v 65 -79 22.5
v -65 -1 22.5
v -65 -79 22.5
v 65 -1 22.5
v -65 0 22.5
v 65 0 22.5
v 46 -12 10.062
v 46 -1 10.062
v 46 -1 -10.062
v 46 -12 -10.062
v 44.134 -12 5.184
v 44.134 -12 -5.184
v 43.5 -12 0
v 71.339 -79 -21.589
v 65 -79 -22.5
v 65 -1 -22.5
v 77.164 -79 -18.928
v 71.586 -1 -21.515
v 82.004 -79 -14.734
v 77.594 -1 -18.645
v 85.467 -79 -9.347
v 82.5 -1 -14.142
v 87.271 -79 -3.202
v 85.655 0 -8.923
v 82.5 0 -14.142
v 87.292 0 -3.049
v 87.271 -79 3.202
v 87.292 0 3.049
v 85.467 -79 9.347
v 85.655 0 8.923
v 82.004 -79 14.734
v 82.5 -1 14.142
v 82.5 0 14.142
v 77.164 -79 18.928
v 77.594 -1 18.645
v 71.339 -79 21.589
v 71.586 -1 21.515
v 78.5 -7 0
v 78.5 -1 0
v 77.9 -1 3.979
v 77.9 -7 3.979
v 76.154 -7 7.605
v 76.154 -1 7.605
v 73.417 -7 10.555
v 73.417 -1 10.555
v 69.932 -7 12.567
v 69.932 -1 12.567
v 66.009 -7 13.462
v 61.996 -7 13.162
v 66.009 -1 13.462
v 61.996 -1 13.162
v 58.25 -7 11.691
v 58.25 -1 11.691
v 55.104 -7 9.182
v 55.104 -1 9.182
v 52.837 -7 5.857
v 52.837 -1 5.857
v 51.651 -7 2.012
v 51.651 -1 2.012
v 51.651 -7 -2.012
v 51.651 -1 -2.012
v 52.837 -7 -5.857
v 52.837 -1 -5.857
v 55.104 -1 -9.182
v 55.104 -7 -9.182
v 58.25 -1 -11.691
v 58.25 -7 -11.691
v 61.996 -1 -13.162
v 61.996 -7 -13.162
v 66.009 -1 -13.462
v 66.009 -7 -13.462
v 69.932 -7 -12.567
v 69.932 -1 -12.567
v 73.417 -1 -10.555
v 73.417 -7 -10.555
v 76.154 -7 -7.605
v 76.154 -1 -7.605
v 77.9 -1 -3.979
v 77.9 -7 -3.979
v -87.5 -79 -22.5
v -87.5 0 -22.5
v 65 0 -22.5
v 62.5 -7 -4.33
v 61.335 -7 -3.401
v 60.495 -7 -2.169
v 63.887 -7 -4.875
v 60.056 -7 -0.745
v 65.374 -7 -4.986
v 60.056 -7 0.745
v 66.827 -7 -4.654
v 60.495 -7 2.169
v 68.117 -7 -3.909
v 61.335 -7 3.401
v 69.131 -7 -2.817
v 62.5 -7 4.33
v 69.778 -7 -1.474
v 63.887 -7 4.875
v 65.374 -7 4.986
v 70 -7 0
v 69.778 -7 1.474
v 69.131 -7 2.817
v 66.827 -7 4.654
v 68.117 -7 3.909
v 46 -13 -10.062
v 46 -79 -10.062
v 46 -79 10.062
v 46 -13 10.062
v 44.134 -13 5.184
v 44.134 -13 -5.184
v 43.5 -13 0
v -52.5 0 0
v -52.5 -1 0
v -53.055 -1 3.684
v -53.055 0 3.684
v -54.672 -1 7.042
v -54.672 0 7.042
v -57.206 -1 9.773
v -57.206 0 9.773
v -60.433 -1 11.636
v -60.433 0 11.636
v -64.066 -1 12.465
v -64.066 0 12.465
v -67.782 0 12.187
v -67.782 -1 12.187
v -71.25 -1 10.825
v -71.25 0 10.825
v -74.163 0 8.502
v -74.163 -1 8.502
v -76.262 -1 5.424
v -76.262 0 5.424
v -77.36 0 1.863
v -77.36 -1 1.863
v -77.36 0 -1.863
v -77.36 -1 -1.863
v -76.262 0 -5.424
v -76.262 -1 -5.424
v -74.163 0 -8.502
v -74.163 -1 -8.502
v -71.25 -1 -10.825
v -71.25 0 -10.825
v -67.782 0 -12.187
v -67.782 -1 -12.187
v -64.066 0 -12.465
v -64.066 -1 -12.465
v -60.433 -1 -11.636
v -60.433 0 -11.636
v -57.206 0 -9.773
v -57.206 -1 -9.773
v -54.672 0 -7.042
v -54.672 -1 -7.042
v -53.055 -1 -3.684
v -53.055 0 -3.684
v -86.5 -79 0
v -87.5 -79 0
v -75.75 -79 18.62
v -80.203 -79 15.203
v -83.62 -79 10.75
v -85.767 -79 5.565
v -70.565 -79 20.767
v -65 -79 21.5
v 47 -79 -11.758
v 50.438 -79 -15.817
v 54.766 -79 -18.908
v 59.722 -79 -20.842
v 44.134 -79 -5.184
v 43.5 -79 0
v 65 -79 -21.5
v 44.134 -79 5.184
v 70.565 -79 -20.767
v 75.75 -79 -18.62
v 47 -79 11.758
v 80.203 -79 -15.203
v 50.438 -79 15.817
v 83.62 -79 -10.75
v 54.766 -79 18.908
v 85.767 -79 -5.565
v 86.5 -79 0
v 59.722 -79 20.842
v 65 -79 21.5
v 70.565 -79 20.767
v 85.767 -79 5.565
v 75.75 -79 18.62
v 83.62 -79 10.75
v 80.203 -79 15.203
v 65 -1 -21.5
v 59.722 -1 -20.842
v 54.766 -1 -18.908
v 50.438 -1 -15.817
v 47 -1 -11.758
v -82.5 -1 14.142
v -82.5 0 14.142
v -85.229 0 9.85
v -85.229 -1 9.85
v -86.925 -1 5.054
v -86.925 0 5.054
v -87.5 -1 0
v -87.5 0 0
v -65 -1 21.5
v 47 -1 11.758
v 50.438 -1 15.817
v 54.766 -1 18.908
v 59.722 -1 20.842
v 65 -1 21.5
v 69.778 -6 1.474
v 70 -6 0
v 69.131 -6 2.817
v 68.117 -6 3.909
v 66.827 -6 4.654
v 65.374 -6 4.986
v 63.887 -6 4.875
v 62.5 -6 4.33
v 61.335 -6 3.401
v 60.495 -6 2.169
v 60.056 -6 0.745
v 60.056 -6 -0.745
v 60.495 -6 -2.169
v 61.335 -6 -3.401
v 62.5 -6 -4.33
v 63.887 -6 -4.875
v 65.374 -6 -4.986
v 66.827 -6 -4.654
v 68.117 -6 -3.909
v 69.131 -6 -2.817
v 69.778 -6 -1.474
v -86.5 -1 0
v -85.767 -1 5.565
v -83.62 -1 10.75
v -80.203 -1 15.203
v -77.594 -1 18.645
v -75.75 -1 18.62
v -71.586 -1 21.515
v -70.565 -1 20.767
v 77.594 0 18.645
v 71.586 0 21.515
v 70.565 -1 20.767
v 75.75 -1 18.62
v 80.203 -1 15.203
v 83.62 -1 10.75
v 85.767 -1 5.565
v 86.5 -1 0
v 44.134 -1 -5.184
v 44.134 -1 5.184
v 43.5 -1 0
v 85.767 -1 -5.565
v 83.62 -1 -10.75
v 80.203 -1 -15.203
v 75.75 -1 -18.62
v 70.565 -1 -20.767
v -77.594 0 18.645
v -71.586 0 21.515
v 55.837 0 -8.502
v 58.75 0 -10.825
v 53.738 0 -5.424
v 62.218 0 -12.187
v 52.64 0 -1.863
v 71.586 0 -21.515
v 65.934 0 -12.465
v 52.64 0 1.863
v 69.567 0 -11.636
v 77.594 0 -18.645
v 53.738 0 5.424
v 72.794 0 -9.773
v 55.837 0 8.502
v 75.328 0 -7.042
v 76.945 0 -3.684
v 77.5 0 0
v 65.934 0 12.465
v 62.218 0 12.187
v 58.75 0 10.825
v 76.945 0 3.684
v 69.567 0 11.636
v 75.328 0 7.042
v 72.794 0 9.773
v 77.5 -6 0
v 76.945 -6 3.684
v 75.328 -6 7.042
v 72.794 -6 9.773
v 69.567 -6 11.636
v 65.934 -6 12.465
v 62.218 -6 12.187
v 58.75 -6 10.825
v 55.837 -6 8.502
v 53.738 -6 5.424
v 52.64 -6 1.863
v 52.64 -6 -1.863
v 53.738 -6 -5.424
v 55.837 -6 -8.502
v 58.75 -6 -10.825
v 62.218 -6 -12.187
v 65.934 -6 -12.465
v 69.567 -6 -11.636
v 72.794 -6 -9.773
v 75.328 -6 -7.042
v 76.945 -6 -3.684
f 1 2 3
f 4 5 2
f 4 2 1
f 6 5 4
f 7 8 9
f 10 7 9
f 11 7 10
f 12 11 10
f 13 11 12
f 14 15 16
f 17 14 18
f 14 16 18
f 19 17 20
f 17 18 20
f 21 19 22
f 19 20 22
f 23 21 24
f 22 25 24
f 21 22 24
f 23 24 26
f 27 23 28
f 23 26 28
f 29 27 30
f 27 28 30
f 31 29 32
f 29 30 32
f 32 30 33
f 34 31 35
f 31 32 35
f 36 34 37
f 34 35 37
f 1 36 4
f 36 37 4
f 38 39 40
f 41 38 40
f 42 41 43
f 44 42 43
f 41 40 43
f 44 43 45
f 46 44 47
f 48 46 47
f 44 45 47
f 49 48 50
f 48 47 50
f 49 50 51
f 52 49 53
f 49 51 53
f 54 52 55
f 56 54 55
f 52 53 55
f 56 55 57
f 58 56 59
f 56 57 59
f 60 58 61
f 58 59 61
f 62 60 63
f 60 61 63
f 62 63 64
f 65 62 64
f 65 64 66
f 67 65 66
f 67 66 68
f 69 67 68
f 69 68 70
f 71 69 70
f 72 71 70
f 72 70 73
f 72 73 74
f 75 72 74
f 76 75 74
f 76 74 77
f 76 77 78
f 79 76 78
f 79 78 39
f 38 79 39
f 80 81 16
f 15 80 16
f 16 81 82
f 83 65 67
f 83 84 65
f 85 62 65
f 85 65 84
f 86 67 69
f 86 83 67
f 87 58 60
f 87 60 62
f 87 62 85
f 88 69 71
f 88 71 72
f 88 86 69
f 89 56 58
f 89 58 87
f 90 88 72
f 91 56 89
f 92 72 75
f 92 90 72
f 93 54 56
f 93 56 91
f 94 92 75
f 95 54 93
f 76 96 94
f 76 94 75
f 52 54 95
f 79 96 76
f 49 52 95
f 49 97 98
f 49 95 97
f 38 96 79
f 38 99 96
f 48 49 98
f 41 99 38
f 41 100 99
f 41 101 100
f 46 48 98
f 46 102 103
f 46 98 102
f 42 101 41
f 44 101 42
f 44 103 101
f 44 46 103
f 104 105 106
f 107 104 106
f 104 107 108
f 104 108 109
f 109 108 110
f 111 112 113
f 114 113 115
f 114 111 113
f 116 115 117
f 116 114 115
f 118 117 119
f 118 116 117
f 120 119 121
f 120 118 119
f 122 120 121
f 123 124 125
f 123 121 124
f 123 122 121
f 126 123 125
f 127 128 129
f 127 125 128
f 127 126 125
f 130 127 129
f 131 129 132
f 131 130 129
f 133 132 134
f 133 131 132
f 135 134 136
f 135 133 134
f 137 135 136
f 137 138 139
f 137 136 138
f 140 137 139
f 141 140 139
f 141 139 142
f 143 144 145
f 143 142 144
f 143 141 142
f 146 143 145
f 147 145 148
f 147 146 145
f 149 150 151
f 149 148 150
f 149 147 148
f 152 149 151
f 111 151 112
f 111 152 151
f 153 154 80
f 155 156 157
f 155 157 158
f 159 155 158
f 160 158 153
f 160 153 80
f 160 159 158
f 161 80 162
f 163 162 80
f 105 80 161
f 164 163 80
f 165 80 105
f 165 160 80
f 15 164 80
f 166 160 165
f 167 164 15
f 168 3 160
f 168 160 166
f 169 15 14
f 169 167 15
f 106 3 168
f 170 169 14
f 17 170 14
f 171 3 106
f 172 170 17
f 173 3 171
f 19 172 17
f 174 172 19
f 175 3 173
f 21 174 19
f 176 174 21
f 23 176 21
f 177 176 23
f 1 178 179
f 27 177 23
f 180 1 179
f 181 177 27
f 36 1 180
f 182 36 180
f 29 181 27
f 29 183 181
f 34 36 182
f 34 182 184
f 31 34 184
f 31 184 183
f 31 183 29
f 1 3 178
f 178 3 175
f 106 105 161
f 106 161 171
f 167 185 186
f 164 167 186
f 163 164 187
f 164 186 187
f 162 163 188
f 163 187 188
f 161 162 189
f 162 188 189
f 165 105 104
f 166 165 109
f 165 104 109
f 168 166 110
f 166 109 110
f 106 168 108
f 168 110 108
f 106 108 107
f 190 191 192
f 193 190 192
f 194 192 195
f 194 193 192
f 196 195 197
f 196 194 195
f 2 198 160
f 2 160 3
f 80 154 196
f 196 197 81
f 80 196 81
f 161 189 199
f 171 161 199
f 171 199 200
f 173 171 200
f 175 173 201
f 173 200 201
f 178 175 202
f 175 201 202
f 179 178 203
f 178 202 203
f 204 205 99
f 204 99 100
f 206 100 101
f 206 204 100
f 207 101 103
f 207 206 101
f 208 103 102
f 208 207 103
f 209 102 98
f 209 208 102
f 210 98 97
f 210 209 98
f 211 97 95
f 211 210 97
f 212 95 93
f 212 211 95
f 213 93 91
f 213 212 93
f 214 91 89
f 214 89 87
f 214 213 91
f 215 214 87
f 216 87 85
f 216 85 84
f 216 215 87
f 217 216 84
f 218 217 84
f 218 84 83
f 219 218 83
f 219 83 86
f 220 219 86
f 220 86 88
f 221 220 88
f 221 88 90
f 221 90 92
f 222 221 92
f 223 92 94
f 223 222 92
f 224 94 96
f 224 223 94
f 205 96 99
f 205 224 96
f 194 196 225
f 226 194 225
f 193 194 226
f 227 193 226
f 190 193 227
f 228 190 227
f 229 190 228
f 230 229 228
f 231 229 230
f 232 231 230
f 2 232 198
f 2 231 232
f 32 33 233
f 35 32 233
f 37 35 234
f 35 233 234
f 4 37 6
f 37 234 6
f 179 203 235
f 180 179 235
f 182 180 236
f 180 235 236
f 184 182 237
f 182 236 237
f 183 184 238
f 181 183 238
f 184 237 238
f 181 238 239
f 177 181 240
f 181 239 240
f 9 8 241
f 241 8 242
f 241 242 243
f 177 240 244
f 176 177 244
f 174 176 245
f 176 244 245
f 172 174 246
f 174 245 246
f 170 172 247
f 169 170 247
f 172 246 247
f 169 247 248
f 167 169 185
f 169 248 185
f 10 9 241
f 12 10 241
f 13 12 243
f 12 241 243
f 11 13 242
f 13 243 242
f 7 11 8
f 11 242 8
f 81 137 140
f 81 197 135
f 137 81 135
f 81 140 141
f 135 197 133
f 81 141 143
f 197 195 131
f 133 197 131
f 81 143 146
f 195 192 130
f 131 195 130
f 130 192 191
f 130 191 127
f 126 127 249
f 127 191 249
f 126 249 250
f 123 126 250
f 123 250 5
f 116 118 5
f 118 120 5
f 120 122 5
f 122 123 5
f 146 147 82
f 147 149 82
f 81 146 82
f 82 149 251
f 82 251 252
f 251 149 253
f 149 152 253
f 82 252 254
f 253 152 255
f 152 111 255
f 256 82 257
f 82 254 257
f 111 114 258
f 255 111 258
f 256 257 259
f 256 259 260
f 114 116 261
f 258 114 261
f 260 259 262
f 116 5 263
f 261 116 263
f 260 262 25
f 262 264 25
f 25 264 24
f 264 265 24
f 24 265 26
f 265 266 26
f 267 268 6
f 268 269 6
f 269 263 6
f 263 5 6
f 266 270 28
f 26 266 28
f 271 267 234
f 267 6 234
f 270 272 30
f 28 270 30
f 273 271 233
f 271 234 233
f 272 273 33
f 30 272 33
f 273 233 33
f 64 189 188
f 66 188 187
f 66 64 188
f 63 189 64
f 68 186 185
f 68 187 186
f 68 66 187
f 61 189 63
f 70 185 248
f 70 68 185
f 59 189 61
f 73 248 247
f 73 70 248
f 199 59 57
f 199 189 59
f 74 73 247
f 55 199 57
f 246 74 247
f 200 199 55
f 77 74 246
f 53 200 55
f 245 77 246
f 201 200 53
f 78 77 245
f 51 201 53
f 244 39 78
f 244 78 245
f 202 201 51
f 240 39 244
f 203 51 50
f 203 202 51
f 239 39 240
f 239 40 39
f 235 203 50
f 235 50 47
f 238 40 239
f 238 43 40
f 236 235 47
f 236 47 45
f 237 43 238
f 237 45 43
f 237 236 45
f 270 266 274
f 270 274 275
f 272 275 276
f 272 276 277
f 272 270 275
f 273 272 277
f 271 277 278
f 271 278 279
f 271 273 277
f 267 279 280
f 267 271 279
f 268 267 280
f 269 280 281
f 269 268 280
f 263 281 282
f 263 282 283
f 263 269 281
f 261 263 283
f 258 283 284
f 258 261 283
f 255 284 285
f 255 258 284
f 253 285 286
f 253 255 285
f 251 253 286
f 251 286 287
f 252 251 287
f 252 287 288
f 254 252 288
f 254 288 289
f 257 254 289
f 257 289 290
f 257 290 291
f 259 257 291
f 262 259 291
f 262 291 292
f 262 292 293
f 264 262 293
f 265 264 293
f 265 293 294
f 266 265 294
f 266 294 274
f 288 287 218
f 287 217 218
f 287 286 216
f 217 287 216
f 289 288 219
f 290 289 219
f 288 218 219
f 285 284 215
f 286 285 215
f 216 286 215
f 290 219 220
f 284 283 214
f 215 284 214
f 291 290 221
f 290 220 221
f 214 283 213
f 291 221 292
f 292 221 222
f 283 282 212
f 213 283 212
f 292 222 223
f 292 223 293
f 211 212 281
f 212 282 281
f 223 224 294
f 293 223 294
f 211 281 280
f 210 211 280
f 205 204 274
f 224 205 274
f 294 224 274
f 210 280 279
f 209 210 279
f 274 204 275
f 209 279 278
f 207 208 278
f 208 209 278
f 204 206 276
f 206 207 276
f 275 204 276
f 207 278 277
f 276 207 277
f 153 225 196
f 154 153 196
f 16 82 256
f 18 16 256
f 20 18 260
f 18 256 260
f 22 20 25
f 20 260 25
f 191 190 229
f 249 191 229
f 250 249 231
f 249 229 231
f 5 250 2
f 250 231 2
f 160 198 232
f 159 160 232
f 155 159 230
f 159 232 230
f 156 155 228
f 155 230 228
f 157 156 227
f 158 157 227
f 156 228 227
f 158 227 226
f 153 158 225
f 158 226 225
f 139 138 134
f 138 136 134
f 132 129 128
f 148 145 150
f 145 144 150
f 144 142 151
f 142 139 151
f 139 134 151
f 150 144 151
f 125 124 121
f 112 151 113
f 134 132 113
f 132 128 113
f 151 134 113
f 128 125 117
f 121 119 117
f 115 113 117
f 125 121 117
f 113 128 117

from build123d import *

# Parameters (mm, degrees)
F0_W      = 165
F0_H      = 45
F0_R      = 12.5
F1_DEPTH  = 1
F3_DEPTH  = 1
F4_DEPTH  = 25
F5_DEPTH  = 25
F6_R      = 13.5
F6_R_2    = 12.5
F7_DEPTH  = 5
F8_R      = 13.5
F8_R_2    = 5
F9_DEPTH  = 1
F11_DEPTH = 1
F12_W     = 1
F12_H     = 1
F12_H_2   = 36
F12_W_2   = 92
F13_DEPTH = 11
F14_W     = 94
F14_H     = 37
F15_DEPTH = 1
F16_W     = 1
F16_H     = 36
F17_DEPTH = 66
F18_W     = 26.2803444985
F18_H     = 1
F19_DEPTH = 3
F20_W     = 130
F20_H     = 1
F21_DEPTH = 78


with BuildPart() as f1:
    # F0 (on Front) → F1 (new body)
    with BuildSketch(Plane.XZ):
        Rectangle(F0_W, F0_H)
        with Locations((-65, 0)):
            Circle(F0_R, mode=Mode.SUBTRACT)
        with Locations((65, 0)):
            Circle(F0_R, mode=Mode.SUBTRACT)
    extrude(amount=F1_DEPTH)

    # F2 (on face) → F3 (join)
    with BuildSketch(Plane.XZ.offset(1)):
        with BuildLine():
            Line((68.3925151825, -19.0988145769), (65, -22.5))
            ThreePointArc((65, -22.5), (87.5, 0), (65, 22.5))
            Line((65, 22.5), (71.474224329, 16.2770561874))
            Line((71.474224329, 16.2770561874), (77.4062722921, 9.1145541519))
            Line((77.4062722921, 9.1145541519), (80.3926512599, 2.1407562308))
            Line((80.3926512599, 2.1407562308), (80.3926512599, -5.2317115478))
            Line((80.3926512599, -5.2317115478), (78.3914923668, -12.1520543471))
            Line((78.3914923668, -12.1520543471), (74.6632069349, -14.4081749022))
            Line((74.6632069349, -14.4081749022), (68.3925151825, -19.0988145769))
        make_face()
        with BuildLine():
            Line((-65, 14.9617949501), (-65, 22.5))
            ThreePointArc((-65, 22.5), (-87.5, 0), (-65, -22.5))
            Line((-65, -22.5), (-67.4760043621, -15.6979020685))
            Line((-67.4760043621, -15.6979020685), (-72.8440880775, -12.9142012447))
            Line((-72.8440880775, -12.9142012447), (-76.5851810575, -7.8018400818))
            Line((-76.5851810575, -7.8018400818), (-79.5639529824, 0))
            Line((-79.5639529824, 0), (-79.5639529824, 6.4657721668))
            Line((-79.5639529824, 6.4657721668), (-75.4495188594, 11.7608513683))
            Line((-75.4495188594, 11.7608513683), (-65, 14.9617949501))
        make_face()
    extrude(amount=-F3_DEPTH)

    # F2 (on face) → F4 (cut)
    with BuildSketch(Plane.XZ.offset(1)):
        with BuildLine():
            Line((-82.5, 22.5), (-82.5, 14.1421356237))
            ThreePointArc((-82.5, 14.1421356237), (-74.6966991411, 20.3033008589), (-65, 22.5))
            Line((-65, 22.5), (-82.5, 22.5))
        make_face()
    extrude(amount=-F4_DEPTH, mode=Mode.SUBTRACT)

    # F2 (on face) → F5 (cut)
    with BuildSketch(Plane.XZ.offset(1)):
        with BuildLine():
            ThreePointArc((82.5, -14.1421356237), (74.6966991411, -20.3033008589), (65, -22.5))
            Line((65, -22.5), (82.5, -22.5))
            Line((82.5, -22.5), (82.5, -14.1421356237))
        make_face()
        with BuildLine():
            ThreePointArc((65, 22.5), (74.6966991411, 20.3033008589), (82.5, 14.1421356237))
            Line((82.5, 14.1421356237), (82.5, 22.5))
            Line((82.5, 22.5), (65, 22.5))
        make_face()
        with BuildLine():
            Line((-82.5, -22.5), (-65, -22.5))
            ThreePointArc((-65, -22.5), (-74.6966991411, -20.3033008589), (-82.5, -14.1421356237))
            Line((-82.5, -14.1421356237), (-82.5, -22.5))
        make_face()
    extrude(amount=-F5_DEPTH, mode=Mode.SUBTRACT)

    # F6 (on face) → F7 (join)
    with BuildSketch(Plane.XZ.offset(1)):
        with Locations((-65, 0)):
            Circle(F6_R)
        with Locations((-65, 0)):
            Circle(F6_R_2, mode=Mode.SUBTRACT)
        with Locations((65, 0)):
            Circle(F6_R)
        with Locations((65, 0)):
            Circle(F6_R_2, mode=Mode.SUBTRACT)
    extrude(amount=F7_DEPTH)

    # F8 (on face) → F9 (join)
    with BuildSketch(Plane.XZ.offset(6)):
        with Locations((-65, 0)):
            Circle(F8_R)
        with Locations((-65, 0)):
            Circle(F8_R_2, mode=Mode.SUBTRACT)
        with Locations((65, 0)):
            Circle(F8_R)
        with Locations((65, 0)):
            Circle(F8_R_2, mode=Mode.SUBTRACT)
    extrude(amount=F9_DEPTH)

    # F10 (on face) → F11 (join)
    with BuildSketch(Plane.XZ.offset(1)):
        Polygon((-81.9395110011, 0), (-87.5, 0), (-87.5, -22.5), (-65, -22.5), (-65, -18.5897927731), (-73.3228996396, -16.0001199692), (-80.1934376359, -9.6208481118), align=None)
    extrude(amount=-F11_DEPTH)

    # F12 (on face) → F13 (join)
    with BuildSketch(Plane.XZ.offset(1)):
        with Locations((46.5, -14)):
            Rectangle(F12_W, F12_H)
        with Locations((46.5, 4.5)):
            Rectangle(F12_W, F12_H_2)
        with Locations((0, -14)):
            Rectangle(F12_W_2, F12_H)
        with Locations((-46.5, -14)):
            Rectangle(F12_W, F12_H)
        with Locations((-46.5, 4.5)):
            Rectangle(F12_W, F12_H_2)
    extrude(amount=F13_DEPTH)

    # F14 (on face) → F15 (join)
    with BuildSketch(Plane.XZ.offset(12)):
        with Locations((0, 4)):
            Rectangle(F14_W, F14_H)
    extrude(amount=F15_DEPTH)

    # F16 (on face) → F17 (join)
    with BuildSketch(Plane.XZ.offset(13)):
        with Locations((-46.5, 4.5)):
            Rectangle(F16_W, F16_H)
        with Locations((46.5, 4.5)):
            Rectangle(F16_W, F16_H)
    extrude(amount=F17_DEPTH)

    # F18 (on face) → F19 (join)
    with BuildSketch(Plane.XZ.offset(1)):
        with Locations((0.058112666, -11)):
            Rectangle(F18_W, F18_H)
    extrude(amount=F19_DEPTH)

    # F20 (on face) → F21 (join)
    with BuildSketch(Plane.XZ.offset(1)):
        with Locations((0, 22)):
            Rectangle(F20_W, F20_H)
        with BuildLine():
            ThreePointArc((65, -22.5), (87.5, 0), (65, 22.5))
            Line((65, 22.5), (65, 21.5))
            ThreePointArc((65, 21.5), (80.2027957955, 15.2027957955), (86.5, 0))
            ThreePointArc((86.5, 0), (80.2027957955, -15.2027957955), (65, -21.5))
            Line((65, -21.5), (65, -22.5))
        make_face()
        with BuildLine():
            Line((65, 21.5), (-65, 21.5))
            ThreePointArc((-65, 21.5), (-80.2027957955, 15.2027957955), (-86.5, 0))
            Line((-86.5, 0), (-86.5, -21.5))
            Line((-86.5, -21.5), (62.4147094786, -21.5))
            Line((62.4147094786, -21.5), (65, -21.5))
            ThreePointArc((65, -21.5), (43.5, 0), (65, 21.5))
        make_face()
        Polygon((-86.5, -22.5), (65, -22.5), (65, -21.5), (62.4147094786, -21.5), (-86.5, -21.5), align=None)
        Polygon((-86.5, -21.5), (-86.5, 0), (-87.5, 0), (-87.5, -22.5), (-86.5, -22.5), align=None)
    extrude(amount=F21_DEPTH)


solid = f1.part
